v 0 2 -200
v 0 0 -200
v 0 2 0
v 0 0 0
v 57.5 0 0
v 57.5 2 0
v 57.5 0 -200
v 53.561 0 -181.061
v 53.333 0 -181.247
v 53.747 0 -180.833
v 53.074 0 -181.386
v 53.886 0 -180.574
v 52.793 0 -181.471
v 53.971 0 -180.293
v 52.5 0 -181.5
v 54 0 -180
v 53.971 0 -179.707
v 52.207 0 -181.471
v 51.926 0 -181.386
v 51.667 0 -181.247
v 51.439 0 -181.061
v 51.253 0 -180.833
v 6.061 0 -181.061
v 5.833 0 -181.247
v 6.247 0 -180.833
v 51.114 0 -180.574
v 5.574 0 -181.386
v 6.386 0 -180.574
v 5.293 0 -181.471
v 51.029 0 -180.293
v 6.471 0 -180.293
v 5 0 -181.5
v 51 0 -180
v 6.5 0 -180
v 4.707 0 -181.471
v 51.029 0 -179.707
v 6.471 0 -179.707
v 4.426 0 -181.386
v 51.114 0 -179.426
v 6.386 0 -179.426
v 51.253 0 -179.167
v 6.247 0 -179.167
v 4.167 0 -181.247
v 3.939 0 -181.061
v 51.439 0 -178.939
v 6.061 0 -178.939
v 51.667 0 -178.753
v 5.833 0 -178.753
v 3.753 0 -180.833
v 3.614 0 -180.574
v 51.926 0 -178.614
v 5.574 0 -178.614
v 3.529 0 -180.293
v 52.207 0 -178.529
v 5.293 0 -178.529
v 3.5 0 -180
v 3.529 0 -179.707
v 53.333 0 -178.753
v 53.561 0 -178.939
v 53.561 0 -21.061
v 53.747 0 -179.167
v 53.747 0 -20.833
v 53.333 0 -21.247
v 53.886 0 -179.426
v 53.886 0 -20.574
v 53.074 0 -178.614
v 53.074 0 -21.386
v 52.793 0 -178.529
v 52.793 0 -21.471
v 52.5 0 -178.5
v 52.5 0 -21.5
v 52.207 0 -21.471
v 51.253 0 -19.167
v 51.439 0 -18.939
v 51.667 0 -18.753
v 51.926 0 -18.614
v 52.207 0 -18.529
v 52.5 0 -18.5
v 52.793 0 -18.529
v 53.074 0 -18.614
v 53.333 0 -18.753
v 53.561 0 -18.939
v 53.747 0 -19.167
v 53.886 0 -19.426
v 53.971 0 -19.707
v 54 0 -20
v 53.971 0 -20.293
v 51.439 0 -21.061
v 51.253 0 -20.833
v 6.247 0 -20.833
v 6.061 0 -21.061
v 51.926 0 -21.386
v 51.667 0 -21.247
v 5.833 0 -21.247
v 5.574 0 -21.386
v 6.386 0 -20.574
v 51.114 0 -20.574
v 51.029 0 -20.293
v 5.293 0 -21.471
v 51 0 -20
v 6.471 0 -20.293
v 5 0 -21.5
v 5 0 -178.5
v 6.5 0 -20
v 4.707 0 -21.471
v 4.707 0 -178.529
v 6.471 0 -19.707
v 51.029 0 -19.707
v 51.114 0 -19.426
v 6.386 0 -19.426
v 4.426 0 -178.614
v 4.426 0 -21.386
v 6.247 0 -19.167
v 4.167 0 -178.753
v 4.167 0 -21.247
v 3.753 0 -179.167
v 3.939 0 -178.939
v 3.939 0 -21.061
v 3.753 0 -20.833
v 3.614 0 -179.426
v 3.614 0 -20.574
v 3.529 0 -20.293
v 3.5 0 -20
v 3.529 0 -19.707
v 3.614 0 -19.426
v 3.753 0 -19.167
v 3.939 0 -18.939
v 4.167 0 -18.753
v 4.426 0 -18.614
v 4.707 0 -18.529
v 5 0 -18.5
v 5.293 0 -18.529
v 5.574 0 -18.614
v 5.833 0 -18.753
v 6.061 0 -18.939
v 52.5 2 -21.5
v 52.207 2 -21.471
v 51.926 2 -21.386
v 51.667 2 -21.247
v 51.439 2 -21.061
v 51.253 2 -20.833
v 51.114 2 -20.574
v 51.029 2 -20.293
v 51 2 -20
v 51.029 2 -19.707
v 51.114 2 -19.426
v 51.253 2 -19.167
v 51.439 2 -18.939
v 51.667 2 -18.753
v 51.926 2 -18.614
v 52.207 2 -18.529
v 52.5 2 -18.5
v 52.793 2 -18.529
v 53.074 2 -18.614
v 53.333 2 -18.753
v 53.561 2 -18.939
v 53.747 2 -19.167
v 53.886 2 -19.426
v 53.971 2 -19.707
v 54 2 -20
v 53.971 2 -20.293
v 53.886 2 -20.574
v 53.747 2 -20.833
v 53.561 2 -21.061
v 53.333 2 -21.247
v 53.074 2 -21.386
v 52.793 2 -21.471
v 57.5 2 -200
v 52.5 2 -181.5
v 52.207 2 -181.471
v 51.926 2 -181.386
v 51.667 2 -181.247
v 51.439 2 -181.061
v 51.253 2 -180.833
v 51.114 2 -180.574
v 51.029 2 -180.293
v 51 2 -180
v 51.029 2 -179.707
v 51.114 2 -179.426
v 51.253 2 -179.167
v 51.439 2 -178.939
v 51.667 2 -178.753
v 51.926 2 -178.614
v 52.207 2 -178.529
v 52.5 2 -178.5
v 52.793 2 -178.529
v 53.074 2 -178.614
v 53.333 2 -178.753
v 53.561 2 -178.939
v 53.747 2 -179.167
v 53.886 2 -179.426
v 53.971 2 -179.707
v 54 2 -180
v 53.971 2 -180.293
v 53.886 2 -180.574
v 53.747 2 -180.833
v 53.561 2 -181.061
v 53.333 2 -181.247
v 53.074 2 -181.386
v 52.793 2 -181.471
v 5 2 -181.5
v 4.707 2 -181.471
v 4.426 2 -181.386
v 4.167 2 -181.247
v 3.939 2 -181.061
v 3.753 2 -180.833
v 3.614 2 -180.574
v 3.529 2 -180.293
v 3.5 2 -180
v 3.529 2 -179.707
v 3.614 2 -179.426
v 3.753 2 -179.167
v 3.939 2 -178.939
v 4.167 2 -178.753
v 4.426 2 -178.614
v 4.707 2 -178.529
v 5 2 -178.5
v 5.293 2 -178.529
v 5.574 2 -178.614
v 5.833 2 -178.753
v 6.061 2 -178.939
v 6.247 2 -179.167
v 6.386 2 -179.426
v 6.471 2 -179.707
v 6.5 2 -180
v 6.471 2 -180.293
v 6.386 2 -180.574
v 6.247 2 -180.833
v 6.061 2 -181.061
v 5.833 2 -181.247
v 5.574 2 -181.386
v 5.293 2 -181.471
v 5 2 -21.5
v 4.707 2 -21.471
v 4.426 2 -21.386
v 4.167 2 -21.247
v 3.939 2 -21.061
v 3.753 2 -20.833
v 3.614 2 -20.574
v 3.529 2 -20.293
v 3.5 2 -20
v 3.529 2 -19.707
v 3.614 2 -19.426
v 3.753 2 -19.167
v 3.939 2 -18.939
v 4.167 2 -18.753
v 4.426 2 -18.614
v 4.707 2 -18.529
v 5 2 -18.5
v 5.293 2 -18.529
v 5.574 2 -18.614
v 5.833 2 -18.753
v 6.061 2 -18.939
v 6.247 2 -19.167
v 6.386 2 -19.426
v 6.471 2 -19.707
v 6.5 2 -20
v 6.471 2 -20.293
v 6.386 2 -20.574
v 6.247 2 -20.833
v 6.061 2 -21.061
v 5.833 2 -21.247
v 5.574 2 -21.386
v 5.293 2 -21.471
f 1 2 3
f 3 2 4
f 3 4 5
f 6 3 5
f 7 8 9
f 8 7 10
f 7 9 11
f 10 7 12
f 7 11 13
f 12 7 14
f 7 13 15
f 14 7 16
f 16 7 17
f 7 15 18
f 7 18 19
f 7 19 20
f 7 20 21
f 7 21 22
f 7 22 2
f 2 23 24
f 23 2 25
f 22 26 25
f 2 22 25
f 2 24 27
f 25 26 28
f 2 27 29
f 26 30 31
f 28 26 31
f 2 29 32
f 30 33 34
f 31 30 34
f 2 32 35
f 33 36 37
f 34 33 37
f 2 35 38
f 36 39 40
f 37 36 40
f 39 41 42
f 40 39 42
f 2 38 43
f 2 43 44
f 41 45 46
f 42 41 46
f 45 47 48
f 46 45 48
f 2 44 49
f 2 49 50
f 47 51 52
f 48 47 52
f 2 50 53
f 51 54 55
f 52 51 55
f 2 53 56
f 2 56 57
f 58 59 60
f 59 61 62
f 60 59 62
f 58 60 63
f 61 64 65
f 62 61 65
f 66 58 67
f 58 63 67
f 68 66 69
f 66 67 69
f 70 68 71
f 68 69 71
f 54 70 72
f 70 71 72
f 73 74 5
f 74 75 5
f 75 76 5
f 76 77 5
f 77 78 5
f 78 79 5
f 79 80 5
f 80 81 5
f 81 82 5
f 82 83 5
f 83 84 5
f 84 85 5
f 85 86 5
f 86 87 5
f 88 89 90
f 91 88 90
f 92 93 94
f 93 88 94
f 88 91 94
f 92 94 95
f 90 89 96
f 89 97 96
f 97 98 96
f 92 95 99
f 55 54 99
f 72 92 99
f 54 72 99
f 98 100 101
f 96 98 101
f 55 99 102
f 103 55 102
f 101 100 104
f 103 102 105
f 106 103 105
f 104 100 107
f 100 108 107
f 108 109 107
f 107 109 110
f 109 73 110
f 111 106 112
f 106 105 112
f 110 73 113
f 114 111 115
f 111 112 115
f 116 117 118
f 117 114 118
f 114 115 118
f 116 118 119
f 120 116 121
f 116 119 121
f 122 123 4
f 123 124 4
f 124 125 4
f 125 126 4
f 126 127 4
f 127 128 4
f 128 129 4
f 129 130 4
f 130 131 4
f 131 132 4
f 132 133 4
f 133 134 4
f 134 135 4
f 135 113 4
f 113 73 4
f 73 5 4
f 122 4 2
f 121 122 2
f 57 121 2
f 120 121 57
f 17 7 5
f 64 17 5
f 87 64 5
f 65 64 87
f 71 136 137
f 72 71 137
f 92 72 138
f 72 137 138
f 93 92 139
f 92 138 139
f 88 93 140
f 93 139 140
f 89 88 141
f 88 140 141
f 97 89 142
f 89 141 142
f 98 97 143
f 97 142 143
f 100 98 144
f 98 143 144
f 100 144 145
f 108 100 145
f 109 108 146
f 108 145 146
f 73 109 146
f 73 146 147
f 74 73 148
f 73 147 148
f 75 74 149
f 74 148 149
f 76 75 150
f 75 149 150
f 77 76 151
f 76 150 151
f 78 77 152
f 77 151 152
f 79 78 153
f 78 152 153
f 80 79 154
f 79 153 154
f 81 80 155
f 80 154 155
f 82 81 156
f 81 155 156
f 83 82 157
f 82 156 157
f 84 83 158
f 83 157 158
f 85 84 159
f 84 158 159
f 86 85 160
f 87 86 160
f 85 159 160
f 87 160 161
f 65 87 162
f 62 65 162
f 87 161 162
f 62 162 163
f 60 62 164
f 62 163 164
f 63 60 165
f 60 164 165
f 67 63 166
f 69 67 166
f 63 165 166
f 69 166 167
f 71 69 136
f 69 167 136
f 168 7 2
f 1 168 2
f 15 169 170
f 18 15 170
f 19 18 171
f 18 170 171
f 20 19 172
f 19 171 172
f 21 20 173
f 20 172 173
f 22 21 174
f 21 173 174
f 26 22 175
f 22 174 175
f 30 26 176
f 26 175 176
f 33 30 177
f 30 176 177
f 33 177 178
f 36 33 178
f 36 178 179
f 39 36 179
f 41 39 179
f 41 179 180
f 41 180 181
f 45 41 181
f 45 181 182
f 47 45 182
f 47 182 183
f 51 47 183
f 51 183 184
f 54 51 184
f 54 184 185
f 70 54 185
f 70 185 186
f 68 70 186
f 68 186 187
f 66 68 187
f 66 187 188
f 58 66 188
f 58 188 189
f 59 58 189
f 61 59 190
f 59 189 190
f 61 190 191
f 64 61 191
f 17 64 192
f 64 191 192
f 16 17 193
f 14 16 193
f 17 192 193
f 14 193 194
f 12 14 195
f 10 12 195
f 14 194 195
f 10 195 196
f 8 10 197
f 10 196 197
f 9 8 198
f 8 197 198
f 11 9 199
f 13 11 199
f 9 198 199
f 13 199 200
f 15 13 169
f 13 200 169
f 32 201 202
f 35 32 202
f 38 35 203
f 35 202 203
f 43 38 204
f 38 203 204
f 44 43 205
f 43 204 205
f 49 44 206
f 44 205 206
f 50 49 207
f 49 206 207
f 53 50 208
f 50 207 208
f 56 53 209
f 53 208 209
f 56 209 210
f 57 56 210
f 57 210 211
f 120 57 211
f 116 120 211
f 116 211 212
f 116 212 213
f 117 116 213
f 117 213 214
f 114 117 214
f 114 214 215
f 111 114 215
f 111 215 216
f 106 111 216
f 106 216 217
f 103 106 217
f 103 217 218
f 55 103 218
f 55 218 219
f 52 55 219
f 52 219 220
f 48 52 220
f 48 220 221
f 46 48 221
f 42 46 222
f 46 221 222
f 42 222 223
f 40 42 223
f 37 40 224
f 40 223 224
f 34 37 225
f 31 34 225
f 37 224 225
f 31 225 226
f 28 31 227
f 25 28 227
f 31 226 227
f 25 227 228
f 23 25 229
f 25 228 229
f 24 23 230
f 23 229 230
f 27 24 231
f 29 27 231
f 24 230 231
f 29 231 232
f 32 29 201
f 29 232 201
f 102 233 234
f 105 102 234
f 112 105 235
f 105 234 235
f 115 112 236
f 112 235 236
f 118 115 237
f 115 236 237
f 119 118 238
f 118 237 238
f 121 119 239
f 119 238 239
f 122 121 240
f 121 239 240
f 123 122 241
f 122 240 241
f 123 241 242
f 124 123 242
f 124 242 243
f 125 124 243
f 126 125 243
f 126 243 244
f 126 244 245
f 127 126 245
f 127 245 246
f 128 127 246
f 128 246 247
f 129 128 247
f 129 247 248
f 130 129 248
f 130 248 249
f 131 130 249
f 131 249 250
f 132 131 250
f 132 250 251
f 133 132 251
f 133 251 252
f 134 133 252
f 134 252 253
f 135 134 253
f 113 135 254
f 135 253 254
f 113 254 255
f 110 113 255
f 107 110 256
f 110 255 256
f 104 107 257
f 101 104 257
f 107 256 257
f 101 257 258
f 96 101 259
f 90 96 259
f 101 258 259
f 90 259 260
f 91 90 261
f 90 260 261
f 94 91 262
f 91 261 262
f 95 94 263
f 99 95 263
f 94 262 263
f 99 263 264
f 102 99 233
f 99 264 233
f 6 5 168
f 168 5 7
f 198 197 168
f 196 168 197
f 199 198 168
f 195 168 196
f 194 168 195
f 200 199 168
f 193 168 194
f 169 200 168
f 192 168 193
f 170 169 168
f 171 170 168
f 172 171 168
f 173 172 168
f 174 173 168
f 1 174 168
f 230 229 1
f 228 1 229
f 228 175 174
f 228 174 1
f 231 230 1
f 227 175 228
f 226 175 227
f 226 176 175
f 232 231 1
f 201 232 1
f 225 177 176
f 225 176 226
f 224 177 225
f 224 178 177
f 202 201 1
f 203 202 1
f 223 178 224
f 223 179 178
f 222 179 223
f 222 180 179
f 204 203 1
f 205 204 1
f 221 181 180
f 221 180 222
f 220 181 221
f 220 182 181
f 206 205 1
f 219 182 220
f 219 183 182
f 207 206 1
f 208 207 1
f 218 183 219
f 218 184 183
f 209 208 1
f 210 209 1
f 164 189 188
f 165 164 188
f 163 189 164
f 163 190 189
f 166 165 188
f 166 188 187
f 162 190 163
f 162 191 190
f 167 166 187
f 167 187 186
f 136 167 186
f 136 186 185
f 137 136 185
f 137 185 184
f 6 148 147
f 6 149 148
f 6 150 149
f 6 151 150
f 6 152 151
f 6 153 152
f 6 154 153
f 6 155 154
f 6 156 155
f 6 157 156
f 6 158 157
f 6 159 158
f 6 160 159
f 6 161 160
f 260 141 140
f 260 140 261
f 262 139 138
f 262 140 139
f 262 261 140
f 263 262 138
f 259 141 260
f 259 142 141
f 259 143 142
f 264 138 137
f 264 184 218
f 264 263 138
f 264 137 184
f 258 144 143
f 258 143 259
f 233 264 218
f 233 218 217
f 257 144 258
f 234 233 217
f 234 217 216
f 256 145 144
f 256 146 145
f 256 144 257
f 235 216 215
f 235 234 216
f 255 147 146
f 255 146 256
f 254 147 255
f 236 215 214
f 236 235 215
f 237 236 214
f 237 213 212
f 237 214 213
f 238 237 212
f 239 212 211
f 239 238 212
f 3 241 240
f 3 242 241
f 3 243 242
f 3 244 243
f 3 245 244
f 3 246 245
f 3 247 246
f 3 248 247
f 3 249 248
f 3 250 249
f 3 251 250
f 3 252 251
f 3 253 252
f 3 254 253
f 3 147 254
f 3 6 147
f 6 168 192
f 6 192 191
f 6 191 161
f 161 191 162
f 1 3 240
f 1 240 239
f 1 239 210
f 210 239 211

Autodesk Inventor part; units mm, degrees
ref_plane "YZ Plane" through (0, 0, 0) normal (1, 0, 0) x (0, 1, 0)
ref_plane "XZ Plane" through (0, 0, 0) normal (0, 1, 0) x (-1, 0, 0)
ref_plane "XY Plane" through (0, 0, 0) normal (0, 0, 1) x (1, 0, 0)
sketch "スケッチ1" plane through (0, 0, 0) normal (0, 1, 0) x (-1, 0, 0)
  line L0 (0, 0) -> (-57.5, 0)
  line L1 (-57.5, 0) -> (-57.5, -200)
  line L2 (-57.5, -200) -> (0, -200)
  line L3 (0, -200) -> (0, 0)
  dimension "d0" = 200
  dimension "d1" = 57.5
extrude "押し出し1" add sketch "スケッチ1" along normal blind 2
sketch "スケッチ3" plane through (0, 0, 0) normal (0, -1, 0) x (1, 0, 0)
  line L0 (57.5, 0) -> (57.5, -200) projected
  line L1 (57.5, -200) -> (0, -200) projected
  line L2 (0, -200) -> (0, 0) projected
  point P0 (52.5, -20)
  point P1 (52.5, -180)
  point P2 (5, -180)
  point P3 (5, -20)
  dimension "d4" = 5
  dimension "d5" = 180
  dimension "d6" = 160
  dimension "d17" = 5
  dimension "d18" = 5
  dimension "d19" = 5
  dimension "d20" = 47.5
hole "穴1" at (52.5, 0, -20) at (52.5, 0, -180) at (5, 0, -180) at (5, 0, -20) direction (0, 1, 0) diameter 3 end through all
properties part number "三段目アクリル板" material "ABS プラスチック"
